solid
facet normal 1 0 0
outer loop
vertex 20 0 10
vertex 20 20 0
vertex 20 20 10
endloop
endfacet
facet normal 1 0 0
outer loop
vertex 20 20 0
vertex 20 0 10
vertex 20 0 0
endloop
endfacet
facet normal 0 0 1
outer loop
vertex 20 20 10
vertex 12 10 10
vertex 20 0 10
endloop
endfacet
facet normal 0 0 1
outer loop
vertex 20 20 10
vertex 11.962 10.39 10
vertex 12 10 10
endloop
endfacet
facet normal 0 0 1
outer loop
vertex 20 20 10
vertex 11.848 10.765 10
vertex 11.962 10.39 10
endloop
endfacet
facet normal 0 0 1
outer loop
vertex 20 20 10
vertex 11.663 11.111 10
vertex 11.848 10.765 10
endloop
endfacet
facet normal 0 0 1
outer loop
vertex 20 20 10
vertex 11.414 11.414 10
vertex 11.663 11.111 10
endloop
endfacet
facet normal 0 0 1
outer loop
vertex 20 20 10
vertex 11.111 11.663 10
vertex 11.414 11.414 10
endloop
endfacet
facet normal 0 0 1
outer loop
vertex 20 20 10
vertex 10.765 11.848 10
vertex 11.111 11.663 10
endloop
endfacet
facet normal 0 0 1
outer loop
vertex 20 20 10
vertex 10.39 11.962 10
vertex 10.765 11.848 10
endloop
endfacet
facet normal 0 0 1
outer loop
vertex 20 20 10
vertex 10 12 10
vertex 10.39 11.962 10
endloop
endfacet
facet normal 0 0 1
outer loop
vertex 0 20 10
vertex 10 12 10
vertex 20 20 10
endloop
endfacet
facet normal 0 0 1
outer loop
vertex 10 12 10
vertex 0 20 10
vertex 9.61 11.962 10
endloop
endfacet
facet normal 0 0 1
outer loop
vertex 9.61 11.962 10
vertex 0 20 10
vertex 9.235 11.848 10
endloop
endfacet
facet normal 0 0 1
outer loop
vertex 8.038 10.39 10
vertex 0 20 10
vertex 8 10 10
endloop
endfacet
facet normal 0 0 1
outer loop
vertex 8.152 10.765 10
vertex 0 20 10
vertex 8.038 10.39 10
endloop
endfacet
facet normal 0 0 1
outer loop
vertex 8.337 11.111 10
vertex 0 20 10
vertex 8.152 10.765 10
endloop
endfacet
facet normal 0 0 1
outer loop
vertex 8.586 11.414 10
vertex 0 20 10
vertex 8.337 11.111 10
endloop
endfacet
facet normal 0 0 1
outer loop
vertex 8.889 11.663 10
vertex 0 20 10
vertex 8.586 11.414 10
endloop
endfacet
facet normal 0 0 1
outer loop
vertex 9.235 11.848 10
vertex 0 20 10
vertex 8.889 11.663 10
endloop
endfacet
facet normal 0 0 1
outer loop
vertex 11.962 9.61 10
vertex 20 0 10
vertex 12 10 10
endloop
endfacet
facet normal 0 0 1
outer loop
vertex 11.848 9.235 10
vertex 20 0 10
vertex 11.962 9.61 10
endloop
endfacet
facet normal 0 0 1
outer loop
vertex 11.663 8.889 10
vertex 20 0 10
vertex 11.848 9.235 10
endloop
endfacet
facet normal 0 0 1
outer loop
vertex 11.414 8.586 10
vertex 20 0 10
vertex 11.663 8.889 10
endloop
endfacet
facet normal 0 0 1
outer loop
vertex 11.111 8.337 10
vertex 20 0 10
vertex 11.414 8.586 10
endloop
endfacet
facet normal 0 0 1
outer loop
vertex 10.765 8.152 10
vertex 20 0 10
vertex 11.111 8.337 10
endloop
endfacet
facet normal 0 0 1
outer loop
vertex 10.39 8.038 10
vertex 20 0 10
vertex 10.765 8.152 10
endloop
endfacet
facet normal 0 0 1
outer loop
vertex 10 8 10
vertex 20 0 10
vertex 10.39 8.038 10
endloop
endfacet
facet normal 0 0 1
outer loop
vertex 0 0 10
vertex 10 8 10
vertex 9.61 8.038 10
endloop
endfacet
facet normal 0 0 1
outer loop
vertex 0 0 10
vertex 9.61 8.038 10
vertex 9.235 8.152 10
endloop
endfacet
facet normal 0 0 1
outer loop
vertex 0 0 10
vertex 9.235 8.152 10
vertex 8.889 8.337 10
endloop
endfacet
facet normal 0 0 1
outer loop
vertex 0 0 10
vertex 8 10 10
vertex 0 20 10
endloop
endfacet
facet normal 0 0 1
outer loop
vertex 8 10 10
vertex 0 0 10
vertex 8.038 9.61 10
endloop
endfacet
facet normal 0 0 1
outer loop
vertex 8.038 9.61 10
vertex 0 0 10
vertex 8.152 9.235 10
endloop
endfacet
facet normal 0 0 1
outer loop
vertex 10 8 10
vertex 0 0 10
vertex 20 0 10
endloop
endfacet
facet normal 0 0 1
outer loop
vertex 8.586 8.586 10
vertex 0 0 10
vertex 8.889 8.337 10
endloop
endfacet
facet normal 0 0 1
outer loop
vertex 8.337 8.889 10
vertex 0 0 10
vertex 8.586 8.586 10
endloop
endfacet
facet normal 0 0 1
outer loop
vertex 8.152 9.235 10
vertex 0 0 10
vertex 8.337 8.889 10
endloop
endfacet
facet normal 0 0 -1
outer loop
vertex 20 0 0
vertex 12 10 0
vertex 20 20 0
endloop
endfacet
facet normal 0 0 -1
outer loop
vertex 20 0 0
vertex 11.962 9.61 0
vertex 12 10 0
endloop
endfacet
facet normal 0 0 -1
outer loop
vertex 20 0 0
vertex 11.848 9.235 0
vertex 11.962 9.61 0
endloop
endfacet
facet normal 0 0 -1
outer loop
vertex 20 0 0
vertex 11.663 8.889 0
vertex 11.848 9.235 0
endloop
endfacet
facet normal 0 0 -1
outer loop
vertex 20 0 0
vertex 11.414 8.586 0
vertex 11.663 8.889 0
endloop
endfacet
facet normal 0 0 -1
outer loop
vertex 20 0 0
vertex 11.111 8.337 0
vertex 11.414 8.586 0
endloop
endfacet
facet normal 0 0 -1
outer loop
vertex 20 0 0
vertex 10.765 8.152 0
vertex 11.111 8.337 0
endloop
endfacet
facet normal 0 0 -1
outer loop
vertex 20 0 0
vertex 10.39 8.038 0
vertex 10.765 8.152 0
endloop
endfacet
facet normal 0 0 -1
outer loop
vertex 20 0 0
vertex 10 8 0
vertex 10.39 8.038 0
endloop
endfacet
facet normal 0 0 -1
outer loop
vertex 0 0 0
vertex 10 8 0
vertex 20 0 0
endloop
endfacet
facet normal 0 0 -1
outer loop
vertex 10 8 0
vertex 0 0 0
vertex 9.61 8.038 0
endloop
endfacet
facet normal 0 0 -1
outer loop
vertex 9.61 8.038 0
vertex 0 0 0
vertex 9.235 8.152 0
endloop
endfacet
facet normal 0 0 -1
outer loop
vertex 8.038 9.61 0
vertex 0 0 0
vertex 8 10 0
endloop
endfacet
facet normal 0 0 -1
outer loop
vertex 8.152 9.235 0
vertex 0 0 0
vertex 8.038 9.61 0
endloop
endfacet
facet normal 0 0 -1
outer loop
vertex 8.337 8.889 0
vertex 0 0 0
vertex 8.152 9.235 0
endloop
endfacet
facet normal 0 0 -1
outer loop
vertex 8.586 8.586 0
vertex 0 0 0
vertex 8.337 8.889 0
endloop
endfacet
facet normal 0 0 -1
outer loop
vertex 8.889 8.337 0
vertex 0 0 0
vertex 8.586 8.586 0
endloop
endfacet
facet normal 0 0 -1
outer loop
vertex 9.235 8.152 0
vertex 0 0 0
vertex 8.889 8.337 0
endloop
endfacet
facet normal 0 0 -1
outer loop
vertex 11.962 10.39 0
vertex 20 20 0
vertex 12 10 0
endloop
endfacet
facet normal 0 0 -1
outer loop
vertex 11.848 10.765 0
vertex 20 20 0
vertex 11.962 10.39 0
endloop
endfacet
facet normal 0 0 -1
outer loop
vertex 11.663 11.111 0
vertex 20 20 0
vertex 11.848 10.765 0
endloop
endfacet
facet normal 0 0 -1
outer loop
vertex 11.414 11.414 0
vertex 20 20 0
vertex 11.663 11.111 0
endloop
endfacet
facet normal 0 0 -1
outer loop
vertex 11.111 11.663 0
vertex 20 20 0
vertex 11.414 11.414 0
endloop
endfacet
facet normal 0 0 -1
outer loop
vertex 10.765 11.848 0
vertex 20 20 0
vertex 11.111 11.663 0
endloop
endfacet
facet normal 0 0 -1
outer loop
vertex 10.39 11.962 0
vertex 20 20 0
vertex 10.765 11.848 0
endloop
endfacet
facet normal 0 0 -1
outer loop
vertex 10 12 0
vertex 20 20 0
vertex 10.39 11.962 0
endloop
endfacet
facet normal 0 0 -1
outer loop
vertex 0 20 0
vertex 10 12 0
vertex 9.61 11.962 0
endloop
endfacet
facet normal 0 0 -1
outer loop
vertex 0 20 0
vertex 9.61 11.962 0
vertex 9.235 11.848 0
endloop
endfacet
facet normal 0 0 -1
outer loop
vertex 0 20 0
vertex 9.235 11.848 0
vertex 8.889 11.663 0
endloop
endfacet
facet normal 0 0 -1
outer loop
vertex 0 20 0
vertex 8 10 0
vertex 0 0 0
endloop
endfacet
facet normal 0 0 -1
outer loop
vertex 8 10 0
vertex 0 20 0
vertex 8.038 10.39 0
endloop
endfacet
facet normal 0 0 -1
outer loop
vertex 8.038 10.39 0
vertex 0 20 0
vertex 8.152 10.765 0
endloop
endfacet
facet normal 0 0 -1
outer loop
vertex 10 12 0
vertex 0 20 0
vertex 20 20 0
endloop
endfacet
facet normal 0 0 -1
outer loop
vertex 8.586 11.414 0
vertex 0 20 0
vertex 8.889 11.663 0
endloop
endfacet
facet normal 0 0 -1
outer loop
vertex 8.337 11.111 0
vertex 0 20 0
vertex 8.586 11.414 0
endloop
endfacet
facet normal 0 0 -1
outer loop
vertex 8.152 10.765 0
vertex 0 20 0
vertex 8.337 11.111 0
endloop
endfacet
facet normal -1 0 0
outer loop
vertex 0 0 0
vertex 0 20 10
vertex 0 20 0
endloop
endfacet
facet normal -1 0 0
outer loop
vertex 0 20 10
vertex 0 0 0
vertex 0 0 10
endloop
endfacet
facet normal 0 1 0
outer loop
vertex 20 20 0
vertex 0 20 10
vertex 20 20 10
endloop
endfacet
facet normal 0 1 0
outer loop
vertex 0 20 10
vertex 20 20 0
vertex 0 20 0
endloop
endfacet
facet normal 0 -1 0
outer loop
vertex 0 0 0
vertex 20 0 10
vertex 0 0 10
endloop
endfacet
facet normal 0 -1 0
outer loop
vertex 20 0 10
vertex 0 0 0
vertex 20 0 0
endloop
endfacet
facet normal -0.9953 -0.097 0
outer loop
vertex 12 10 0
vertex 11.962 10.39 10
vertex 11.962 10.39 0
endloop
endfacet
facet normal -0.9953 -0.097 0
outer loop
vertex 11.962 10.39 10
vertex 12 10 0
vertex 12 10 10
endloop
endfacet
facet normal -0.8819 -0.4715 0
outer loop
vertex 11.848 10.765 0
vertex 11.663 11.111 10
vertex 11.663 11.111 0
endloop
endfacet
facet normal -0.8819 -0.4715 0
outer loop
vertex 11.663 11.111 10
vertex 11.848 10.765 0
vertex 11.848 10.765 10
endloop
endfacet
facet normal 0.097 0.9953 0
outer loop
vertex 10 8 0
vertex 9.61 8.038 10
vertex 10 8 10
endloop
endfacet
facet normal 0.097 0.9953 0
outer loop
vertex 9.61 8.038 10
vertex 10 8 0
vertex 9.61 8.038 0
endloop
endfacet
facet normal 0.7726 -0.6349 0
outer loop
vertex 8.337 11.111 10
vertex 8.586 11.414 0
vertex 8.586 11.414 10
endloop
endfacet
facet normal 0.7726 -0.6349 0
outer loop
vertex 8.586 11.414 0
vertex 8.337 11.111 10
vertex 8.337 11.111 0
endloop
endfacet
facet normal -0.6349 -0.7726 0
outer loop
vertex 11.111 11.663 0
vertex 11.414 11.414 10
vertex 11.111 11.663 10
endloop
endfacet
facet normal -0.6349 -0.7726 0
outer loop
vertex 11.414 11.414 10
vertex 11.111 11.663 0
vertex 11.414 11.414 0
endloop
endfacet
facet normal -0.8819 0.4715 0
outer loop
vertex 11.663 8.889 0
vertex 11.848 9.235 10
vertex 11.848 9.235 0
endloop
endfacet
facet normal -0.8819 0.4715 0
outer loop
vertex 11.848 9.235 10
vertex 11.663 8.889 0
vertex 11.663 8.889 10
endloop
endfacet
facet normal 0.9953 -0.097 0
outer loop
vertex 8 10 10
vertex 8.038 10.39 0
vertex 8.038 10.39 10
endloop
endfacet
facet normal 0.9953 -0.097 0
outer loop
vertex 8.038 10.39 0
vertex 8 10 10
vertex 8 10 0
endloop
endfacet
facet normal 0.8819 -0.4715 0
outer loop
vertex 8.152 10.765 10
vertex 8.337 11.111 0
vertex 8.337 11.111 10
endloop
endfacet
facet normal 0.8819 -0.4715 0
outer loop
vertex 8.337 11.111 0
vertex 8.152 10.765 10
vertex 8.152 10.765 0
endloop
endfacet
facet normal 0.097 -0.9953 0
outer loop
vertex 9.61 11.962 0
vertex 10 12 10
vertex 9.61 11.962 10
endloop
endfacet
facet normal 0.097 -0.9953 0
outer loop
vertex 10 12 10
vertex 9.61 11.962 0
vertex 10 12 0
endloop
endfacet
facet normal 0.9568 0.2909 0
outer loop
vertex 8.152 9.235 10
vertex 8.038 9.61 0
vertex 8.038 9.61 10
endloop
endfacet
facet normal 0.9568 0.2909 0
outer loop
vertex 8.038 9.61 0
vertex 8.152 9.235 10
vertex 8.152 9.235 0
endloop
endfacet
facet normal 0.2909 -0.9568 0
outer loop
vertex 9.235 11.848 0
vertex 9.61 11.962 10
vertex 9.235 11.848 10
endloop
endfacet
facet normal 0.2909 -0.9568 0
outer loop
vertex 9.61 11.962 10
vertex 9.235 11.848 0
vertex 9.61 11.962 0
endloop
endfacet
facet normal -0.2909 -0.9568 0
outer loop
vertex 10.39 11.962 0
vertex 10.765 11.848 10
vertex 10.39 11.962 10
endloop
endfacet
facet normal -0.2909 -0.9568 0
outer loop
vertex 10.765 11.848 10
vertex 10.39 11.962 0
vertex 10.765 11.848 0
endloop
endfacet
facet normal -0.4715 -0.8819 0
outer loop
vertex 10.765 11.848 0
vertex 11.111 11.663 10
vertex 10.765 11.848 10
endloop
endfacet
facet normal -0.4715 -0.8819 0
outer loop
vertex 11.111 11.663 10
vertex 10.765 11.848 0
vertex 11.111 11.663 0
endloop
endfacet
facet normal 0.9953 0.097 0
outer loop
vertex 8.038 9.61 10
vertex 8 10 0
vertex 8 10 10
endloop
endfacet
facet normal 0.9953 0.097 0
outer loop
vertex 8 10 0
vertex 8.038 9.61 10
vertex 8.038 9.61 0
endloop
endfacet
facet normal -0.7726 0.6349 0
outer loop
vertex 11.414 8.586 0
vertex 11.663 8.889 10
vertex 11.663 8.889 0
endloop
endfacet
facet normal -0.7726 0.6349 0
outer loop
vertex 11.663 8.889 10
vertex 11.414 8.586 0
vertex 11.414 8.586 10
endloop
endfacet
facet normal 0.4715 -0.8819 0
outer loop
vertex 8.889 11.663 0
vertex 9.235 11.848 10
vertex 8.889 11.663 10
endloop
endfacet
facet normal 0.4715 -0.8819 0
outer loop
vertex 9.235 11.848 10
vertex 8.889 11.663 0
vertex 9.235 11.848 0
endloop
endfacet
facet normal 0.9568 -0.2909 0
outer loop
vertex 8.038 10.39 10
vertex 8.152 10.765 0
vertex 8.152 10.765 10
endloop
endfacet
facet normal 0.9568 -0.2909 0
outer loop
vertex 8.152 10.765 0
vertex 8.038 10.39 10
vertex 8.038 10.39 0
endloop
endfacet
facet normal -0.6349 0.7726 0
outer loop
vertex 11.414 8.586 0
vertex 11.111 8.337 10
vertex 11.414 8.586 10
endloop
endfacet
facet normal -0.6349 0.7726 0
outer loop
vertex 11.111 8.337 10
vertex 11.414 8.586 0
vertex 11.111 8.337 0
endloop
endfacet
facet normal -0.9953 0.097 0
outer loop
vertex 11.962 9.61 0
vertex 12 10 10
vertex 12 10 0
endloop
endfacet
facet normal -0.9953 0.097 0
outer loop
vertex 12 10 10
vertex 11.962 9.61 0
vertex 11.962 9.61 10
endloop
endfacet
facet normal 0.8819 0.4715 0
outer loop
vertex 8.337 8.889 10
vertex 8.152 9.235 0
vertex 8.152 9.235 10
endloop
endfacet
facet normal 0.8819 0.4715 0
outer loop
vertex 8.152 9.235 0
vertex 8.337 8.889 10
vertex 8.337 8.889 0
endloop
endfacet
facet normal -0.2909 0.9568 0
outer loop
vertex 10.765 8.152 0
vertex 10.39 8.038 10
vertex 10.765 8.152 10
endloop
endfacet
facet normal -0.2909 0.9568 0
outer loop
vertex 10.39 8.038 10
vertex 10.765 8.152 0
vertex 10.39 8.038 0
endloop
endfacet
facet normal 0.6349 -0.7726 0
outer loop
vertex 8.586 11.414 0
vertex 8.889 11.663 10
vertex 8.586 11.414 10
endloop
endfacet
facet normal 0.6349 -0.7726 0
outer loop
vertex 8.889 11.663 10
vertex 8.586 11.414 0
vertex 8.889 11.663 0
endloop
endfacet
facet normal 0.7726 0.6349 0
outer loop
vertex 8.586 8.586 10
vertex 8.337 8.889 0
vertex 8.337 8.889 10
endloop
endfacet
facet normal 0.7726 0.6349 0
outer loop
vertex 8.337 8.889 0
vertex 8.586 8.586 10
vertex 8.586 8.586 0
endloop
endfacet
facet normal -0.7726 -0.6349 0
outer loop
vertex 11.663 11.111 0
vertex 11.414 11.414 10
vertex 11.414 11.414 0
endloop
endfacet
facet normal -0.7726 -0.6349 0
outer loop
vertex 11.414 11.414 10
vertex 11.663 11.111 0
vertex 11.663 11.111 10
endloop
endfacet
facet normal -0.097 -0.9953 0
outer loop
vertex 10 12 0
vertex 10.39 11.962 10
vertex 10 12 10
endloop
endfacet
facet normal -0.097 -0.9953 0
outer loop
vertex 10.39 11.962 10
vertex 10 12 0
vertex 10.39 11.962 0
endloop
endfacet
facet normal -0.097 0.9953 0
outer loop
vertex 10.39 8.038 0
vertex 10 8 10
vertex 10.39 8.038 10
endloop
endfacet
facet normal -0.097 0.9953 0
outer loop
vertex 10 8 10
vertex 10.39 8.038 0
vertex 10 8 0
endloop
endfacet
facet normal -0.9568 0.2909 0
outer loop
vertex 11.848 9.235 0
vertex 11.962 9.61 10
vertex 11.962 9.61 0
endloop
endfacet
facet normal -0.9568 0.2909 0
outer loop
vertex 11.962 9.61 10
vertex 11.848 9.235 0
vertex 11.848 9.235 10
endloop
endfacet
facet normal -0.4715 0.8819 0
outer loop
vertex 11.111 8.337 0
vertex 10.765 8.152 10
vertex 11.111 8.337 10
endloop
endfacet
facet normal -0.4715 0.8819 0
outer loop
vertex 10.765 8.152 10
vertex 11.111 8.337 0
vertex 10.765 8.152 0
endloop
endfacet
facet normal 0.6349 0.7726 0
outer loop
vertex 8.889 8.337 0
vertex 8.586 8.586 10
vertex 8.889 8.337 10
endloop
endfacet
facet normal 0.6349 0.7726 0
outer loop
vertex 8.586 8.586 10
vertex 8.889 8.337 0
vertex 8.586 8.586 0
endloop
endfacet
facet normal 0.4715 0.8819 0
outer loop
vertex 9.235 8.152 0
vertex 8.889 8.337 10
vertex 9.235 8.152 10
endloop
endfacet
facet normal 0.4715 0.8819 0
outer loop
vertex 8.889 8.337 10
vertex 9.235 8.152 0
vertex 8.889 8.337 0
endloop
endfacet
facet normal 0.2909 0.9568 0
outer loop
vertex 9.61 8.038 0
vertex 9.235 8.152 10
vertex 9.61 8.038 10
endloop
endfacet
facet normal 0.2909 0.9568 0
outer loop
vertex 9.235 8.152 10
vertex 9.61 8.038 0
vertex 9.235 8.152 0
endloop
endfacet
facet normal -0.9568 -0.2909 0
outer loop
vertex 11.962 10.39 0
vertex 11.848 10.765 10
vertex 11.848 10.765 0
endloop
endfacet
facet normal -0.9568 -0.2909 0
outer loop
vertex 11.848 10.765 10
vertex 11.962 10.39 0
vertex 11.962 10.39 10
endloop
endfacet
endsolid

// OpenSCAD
// A finished plain-SCAD target; dimensions stay source-authored.
$fn = 32;
width = 20;
difference() {
    union() {
cube([width, 20, 10]);
    }
    // Fixed local placement; diameter 4, depth 12, into the top face.
    translate([10, 10, 10])
        rotate([0, 180, 0])
            cylinder(d=4, h=12, center=false);
}
